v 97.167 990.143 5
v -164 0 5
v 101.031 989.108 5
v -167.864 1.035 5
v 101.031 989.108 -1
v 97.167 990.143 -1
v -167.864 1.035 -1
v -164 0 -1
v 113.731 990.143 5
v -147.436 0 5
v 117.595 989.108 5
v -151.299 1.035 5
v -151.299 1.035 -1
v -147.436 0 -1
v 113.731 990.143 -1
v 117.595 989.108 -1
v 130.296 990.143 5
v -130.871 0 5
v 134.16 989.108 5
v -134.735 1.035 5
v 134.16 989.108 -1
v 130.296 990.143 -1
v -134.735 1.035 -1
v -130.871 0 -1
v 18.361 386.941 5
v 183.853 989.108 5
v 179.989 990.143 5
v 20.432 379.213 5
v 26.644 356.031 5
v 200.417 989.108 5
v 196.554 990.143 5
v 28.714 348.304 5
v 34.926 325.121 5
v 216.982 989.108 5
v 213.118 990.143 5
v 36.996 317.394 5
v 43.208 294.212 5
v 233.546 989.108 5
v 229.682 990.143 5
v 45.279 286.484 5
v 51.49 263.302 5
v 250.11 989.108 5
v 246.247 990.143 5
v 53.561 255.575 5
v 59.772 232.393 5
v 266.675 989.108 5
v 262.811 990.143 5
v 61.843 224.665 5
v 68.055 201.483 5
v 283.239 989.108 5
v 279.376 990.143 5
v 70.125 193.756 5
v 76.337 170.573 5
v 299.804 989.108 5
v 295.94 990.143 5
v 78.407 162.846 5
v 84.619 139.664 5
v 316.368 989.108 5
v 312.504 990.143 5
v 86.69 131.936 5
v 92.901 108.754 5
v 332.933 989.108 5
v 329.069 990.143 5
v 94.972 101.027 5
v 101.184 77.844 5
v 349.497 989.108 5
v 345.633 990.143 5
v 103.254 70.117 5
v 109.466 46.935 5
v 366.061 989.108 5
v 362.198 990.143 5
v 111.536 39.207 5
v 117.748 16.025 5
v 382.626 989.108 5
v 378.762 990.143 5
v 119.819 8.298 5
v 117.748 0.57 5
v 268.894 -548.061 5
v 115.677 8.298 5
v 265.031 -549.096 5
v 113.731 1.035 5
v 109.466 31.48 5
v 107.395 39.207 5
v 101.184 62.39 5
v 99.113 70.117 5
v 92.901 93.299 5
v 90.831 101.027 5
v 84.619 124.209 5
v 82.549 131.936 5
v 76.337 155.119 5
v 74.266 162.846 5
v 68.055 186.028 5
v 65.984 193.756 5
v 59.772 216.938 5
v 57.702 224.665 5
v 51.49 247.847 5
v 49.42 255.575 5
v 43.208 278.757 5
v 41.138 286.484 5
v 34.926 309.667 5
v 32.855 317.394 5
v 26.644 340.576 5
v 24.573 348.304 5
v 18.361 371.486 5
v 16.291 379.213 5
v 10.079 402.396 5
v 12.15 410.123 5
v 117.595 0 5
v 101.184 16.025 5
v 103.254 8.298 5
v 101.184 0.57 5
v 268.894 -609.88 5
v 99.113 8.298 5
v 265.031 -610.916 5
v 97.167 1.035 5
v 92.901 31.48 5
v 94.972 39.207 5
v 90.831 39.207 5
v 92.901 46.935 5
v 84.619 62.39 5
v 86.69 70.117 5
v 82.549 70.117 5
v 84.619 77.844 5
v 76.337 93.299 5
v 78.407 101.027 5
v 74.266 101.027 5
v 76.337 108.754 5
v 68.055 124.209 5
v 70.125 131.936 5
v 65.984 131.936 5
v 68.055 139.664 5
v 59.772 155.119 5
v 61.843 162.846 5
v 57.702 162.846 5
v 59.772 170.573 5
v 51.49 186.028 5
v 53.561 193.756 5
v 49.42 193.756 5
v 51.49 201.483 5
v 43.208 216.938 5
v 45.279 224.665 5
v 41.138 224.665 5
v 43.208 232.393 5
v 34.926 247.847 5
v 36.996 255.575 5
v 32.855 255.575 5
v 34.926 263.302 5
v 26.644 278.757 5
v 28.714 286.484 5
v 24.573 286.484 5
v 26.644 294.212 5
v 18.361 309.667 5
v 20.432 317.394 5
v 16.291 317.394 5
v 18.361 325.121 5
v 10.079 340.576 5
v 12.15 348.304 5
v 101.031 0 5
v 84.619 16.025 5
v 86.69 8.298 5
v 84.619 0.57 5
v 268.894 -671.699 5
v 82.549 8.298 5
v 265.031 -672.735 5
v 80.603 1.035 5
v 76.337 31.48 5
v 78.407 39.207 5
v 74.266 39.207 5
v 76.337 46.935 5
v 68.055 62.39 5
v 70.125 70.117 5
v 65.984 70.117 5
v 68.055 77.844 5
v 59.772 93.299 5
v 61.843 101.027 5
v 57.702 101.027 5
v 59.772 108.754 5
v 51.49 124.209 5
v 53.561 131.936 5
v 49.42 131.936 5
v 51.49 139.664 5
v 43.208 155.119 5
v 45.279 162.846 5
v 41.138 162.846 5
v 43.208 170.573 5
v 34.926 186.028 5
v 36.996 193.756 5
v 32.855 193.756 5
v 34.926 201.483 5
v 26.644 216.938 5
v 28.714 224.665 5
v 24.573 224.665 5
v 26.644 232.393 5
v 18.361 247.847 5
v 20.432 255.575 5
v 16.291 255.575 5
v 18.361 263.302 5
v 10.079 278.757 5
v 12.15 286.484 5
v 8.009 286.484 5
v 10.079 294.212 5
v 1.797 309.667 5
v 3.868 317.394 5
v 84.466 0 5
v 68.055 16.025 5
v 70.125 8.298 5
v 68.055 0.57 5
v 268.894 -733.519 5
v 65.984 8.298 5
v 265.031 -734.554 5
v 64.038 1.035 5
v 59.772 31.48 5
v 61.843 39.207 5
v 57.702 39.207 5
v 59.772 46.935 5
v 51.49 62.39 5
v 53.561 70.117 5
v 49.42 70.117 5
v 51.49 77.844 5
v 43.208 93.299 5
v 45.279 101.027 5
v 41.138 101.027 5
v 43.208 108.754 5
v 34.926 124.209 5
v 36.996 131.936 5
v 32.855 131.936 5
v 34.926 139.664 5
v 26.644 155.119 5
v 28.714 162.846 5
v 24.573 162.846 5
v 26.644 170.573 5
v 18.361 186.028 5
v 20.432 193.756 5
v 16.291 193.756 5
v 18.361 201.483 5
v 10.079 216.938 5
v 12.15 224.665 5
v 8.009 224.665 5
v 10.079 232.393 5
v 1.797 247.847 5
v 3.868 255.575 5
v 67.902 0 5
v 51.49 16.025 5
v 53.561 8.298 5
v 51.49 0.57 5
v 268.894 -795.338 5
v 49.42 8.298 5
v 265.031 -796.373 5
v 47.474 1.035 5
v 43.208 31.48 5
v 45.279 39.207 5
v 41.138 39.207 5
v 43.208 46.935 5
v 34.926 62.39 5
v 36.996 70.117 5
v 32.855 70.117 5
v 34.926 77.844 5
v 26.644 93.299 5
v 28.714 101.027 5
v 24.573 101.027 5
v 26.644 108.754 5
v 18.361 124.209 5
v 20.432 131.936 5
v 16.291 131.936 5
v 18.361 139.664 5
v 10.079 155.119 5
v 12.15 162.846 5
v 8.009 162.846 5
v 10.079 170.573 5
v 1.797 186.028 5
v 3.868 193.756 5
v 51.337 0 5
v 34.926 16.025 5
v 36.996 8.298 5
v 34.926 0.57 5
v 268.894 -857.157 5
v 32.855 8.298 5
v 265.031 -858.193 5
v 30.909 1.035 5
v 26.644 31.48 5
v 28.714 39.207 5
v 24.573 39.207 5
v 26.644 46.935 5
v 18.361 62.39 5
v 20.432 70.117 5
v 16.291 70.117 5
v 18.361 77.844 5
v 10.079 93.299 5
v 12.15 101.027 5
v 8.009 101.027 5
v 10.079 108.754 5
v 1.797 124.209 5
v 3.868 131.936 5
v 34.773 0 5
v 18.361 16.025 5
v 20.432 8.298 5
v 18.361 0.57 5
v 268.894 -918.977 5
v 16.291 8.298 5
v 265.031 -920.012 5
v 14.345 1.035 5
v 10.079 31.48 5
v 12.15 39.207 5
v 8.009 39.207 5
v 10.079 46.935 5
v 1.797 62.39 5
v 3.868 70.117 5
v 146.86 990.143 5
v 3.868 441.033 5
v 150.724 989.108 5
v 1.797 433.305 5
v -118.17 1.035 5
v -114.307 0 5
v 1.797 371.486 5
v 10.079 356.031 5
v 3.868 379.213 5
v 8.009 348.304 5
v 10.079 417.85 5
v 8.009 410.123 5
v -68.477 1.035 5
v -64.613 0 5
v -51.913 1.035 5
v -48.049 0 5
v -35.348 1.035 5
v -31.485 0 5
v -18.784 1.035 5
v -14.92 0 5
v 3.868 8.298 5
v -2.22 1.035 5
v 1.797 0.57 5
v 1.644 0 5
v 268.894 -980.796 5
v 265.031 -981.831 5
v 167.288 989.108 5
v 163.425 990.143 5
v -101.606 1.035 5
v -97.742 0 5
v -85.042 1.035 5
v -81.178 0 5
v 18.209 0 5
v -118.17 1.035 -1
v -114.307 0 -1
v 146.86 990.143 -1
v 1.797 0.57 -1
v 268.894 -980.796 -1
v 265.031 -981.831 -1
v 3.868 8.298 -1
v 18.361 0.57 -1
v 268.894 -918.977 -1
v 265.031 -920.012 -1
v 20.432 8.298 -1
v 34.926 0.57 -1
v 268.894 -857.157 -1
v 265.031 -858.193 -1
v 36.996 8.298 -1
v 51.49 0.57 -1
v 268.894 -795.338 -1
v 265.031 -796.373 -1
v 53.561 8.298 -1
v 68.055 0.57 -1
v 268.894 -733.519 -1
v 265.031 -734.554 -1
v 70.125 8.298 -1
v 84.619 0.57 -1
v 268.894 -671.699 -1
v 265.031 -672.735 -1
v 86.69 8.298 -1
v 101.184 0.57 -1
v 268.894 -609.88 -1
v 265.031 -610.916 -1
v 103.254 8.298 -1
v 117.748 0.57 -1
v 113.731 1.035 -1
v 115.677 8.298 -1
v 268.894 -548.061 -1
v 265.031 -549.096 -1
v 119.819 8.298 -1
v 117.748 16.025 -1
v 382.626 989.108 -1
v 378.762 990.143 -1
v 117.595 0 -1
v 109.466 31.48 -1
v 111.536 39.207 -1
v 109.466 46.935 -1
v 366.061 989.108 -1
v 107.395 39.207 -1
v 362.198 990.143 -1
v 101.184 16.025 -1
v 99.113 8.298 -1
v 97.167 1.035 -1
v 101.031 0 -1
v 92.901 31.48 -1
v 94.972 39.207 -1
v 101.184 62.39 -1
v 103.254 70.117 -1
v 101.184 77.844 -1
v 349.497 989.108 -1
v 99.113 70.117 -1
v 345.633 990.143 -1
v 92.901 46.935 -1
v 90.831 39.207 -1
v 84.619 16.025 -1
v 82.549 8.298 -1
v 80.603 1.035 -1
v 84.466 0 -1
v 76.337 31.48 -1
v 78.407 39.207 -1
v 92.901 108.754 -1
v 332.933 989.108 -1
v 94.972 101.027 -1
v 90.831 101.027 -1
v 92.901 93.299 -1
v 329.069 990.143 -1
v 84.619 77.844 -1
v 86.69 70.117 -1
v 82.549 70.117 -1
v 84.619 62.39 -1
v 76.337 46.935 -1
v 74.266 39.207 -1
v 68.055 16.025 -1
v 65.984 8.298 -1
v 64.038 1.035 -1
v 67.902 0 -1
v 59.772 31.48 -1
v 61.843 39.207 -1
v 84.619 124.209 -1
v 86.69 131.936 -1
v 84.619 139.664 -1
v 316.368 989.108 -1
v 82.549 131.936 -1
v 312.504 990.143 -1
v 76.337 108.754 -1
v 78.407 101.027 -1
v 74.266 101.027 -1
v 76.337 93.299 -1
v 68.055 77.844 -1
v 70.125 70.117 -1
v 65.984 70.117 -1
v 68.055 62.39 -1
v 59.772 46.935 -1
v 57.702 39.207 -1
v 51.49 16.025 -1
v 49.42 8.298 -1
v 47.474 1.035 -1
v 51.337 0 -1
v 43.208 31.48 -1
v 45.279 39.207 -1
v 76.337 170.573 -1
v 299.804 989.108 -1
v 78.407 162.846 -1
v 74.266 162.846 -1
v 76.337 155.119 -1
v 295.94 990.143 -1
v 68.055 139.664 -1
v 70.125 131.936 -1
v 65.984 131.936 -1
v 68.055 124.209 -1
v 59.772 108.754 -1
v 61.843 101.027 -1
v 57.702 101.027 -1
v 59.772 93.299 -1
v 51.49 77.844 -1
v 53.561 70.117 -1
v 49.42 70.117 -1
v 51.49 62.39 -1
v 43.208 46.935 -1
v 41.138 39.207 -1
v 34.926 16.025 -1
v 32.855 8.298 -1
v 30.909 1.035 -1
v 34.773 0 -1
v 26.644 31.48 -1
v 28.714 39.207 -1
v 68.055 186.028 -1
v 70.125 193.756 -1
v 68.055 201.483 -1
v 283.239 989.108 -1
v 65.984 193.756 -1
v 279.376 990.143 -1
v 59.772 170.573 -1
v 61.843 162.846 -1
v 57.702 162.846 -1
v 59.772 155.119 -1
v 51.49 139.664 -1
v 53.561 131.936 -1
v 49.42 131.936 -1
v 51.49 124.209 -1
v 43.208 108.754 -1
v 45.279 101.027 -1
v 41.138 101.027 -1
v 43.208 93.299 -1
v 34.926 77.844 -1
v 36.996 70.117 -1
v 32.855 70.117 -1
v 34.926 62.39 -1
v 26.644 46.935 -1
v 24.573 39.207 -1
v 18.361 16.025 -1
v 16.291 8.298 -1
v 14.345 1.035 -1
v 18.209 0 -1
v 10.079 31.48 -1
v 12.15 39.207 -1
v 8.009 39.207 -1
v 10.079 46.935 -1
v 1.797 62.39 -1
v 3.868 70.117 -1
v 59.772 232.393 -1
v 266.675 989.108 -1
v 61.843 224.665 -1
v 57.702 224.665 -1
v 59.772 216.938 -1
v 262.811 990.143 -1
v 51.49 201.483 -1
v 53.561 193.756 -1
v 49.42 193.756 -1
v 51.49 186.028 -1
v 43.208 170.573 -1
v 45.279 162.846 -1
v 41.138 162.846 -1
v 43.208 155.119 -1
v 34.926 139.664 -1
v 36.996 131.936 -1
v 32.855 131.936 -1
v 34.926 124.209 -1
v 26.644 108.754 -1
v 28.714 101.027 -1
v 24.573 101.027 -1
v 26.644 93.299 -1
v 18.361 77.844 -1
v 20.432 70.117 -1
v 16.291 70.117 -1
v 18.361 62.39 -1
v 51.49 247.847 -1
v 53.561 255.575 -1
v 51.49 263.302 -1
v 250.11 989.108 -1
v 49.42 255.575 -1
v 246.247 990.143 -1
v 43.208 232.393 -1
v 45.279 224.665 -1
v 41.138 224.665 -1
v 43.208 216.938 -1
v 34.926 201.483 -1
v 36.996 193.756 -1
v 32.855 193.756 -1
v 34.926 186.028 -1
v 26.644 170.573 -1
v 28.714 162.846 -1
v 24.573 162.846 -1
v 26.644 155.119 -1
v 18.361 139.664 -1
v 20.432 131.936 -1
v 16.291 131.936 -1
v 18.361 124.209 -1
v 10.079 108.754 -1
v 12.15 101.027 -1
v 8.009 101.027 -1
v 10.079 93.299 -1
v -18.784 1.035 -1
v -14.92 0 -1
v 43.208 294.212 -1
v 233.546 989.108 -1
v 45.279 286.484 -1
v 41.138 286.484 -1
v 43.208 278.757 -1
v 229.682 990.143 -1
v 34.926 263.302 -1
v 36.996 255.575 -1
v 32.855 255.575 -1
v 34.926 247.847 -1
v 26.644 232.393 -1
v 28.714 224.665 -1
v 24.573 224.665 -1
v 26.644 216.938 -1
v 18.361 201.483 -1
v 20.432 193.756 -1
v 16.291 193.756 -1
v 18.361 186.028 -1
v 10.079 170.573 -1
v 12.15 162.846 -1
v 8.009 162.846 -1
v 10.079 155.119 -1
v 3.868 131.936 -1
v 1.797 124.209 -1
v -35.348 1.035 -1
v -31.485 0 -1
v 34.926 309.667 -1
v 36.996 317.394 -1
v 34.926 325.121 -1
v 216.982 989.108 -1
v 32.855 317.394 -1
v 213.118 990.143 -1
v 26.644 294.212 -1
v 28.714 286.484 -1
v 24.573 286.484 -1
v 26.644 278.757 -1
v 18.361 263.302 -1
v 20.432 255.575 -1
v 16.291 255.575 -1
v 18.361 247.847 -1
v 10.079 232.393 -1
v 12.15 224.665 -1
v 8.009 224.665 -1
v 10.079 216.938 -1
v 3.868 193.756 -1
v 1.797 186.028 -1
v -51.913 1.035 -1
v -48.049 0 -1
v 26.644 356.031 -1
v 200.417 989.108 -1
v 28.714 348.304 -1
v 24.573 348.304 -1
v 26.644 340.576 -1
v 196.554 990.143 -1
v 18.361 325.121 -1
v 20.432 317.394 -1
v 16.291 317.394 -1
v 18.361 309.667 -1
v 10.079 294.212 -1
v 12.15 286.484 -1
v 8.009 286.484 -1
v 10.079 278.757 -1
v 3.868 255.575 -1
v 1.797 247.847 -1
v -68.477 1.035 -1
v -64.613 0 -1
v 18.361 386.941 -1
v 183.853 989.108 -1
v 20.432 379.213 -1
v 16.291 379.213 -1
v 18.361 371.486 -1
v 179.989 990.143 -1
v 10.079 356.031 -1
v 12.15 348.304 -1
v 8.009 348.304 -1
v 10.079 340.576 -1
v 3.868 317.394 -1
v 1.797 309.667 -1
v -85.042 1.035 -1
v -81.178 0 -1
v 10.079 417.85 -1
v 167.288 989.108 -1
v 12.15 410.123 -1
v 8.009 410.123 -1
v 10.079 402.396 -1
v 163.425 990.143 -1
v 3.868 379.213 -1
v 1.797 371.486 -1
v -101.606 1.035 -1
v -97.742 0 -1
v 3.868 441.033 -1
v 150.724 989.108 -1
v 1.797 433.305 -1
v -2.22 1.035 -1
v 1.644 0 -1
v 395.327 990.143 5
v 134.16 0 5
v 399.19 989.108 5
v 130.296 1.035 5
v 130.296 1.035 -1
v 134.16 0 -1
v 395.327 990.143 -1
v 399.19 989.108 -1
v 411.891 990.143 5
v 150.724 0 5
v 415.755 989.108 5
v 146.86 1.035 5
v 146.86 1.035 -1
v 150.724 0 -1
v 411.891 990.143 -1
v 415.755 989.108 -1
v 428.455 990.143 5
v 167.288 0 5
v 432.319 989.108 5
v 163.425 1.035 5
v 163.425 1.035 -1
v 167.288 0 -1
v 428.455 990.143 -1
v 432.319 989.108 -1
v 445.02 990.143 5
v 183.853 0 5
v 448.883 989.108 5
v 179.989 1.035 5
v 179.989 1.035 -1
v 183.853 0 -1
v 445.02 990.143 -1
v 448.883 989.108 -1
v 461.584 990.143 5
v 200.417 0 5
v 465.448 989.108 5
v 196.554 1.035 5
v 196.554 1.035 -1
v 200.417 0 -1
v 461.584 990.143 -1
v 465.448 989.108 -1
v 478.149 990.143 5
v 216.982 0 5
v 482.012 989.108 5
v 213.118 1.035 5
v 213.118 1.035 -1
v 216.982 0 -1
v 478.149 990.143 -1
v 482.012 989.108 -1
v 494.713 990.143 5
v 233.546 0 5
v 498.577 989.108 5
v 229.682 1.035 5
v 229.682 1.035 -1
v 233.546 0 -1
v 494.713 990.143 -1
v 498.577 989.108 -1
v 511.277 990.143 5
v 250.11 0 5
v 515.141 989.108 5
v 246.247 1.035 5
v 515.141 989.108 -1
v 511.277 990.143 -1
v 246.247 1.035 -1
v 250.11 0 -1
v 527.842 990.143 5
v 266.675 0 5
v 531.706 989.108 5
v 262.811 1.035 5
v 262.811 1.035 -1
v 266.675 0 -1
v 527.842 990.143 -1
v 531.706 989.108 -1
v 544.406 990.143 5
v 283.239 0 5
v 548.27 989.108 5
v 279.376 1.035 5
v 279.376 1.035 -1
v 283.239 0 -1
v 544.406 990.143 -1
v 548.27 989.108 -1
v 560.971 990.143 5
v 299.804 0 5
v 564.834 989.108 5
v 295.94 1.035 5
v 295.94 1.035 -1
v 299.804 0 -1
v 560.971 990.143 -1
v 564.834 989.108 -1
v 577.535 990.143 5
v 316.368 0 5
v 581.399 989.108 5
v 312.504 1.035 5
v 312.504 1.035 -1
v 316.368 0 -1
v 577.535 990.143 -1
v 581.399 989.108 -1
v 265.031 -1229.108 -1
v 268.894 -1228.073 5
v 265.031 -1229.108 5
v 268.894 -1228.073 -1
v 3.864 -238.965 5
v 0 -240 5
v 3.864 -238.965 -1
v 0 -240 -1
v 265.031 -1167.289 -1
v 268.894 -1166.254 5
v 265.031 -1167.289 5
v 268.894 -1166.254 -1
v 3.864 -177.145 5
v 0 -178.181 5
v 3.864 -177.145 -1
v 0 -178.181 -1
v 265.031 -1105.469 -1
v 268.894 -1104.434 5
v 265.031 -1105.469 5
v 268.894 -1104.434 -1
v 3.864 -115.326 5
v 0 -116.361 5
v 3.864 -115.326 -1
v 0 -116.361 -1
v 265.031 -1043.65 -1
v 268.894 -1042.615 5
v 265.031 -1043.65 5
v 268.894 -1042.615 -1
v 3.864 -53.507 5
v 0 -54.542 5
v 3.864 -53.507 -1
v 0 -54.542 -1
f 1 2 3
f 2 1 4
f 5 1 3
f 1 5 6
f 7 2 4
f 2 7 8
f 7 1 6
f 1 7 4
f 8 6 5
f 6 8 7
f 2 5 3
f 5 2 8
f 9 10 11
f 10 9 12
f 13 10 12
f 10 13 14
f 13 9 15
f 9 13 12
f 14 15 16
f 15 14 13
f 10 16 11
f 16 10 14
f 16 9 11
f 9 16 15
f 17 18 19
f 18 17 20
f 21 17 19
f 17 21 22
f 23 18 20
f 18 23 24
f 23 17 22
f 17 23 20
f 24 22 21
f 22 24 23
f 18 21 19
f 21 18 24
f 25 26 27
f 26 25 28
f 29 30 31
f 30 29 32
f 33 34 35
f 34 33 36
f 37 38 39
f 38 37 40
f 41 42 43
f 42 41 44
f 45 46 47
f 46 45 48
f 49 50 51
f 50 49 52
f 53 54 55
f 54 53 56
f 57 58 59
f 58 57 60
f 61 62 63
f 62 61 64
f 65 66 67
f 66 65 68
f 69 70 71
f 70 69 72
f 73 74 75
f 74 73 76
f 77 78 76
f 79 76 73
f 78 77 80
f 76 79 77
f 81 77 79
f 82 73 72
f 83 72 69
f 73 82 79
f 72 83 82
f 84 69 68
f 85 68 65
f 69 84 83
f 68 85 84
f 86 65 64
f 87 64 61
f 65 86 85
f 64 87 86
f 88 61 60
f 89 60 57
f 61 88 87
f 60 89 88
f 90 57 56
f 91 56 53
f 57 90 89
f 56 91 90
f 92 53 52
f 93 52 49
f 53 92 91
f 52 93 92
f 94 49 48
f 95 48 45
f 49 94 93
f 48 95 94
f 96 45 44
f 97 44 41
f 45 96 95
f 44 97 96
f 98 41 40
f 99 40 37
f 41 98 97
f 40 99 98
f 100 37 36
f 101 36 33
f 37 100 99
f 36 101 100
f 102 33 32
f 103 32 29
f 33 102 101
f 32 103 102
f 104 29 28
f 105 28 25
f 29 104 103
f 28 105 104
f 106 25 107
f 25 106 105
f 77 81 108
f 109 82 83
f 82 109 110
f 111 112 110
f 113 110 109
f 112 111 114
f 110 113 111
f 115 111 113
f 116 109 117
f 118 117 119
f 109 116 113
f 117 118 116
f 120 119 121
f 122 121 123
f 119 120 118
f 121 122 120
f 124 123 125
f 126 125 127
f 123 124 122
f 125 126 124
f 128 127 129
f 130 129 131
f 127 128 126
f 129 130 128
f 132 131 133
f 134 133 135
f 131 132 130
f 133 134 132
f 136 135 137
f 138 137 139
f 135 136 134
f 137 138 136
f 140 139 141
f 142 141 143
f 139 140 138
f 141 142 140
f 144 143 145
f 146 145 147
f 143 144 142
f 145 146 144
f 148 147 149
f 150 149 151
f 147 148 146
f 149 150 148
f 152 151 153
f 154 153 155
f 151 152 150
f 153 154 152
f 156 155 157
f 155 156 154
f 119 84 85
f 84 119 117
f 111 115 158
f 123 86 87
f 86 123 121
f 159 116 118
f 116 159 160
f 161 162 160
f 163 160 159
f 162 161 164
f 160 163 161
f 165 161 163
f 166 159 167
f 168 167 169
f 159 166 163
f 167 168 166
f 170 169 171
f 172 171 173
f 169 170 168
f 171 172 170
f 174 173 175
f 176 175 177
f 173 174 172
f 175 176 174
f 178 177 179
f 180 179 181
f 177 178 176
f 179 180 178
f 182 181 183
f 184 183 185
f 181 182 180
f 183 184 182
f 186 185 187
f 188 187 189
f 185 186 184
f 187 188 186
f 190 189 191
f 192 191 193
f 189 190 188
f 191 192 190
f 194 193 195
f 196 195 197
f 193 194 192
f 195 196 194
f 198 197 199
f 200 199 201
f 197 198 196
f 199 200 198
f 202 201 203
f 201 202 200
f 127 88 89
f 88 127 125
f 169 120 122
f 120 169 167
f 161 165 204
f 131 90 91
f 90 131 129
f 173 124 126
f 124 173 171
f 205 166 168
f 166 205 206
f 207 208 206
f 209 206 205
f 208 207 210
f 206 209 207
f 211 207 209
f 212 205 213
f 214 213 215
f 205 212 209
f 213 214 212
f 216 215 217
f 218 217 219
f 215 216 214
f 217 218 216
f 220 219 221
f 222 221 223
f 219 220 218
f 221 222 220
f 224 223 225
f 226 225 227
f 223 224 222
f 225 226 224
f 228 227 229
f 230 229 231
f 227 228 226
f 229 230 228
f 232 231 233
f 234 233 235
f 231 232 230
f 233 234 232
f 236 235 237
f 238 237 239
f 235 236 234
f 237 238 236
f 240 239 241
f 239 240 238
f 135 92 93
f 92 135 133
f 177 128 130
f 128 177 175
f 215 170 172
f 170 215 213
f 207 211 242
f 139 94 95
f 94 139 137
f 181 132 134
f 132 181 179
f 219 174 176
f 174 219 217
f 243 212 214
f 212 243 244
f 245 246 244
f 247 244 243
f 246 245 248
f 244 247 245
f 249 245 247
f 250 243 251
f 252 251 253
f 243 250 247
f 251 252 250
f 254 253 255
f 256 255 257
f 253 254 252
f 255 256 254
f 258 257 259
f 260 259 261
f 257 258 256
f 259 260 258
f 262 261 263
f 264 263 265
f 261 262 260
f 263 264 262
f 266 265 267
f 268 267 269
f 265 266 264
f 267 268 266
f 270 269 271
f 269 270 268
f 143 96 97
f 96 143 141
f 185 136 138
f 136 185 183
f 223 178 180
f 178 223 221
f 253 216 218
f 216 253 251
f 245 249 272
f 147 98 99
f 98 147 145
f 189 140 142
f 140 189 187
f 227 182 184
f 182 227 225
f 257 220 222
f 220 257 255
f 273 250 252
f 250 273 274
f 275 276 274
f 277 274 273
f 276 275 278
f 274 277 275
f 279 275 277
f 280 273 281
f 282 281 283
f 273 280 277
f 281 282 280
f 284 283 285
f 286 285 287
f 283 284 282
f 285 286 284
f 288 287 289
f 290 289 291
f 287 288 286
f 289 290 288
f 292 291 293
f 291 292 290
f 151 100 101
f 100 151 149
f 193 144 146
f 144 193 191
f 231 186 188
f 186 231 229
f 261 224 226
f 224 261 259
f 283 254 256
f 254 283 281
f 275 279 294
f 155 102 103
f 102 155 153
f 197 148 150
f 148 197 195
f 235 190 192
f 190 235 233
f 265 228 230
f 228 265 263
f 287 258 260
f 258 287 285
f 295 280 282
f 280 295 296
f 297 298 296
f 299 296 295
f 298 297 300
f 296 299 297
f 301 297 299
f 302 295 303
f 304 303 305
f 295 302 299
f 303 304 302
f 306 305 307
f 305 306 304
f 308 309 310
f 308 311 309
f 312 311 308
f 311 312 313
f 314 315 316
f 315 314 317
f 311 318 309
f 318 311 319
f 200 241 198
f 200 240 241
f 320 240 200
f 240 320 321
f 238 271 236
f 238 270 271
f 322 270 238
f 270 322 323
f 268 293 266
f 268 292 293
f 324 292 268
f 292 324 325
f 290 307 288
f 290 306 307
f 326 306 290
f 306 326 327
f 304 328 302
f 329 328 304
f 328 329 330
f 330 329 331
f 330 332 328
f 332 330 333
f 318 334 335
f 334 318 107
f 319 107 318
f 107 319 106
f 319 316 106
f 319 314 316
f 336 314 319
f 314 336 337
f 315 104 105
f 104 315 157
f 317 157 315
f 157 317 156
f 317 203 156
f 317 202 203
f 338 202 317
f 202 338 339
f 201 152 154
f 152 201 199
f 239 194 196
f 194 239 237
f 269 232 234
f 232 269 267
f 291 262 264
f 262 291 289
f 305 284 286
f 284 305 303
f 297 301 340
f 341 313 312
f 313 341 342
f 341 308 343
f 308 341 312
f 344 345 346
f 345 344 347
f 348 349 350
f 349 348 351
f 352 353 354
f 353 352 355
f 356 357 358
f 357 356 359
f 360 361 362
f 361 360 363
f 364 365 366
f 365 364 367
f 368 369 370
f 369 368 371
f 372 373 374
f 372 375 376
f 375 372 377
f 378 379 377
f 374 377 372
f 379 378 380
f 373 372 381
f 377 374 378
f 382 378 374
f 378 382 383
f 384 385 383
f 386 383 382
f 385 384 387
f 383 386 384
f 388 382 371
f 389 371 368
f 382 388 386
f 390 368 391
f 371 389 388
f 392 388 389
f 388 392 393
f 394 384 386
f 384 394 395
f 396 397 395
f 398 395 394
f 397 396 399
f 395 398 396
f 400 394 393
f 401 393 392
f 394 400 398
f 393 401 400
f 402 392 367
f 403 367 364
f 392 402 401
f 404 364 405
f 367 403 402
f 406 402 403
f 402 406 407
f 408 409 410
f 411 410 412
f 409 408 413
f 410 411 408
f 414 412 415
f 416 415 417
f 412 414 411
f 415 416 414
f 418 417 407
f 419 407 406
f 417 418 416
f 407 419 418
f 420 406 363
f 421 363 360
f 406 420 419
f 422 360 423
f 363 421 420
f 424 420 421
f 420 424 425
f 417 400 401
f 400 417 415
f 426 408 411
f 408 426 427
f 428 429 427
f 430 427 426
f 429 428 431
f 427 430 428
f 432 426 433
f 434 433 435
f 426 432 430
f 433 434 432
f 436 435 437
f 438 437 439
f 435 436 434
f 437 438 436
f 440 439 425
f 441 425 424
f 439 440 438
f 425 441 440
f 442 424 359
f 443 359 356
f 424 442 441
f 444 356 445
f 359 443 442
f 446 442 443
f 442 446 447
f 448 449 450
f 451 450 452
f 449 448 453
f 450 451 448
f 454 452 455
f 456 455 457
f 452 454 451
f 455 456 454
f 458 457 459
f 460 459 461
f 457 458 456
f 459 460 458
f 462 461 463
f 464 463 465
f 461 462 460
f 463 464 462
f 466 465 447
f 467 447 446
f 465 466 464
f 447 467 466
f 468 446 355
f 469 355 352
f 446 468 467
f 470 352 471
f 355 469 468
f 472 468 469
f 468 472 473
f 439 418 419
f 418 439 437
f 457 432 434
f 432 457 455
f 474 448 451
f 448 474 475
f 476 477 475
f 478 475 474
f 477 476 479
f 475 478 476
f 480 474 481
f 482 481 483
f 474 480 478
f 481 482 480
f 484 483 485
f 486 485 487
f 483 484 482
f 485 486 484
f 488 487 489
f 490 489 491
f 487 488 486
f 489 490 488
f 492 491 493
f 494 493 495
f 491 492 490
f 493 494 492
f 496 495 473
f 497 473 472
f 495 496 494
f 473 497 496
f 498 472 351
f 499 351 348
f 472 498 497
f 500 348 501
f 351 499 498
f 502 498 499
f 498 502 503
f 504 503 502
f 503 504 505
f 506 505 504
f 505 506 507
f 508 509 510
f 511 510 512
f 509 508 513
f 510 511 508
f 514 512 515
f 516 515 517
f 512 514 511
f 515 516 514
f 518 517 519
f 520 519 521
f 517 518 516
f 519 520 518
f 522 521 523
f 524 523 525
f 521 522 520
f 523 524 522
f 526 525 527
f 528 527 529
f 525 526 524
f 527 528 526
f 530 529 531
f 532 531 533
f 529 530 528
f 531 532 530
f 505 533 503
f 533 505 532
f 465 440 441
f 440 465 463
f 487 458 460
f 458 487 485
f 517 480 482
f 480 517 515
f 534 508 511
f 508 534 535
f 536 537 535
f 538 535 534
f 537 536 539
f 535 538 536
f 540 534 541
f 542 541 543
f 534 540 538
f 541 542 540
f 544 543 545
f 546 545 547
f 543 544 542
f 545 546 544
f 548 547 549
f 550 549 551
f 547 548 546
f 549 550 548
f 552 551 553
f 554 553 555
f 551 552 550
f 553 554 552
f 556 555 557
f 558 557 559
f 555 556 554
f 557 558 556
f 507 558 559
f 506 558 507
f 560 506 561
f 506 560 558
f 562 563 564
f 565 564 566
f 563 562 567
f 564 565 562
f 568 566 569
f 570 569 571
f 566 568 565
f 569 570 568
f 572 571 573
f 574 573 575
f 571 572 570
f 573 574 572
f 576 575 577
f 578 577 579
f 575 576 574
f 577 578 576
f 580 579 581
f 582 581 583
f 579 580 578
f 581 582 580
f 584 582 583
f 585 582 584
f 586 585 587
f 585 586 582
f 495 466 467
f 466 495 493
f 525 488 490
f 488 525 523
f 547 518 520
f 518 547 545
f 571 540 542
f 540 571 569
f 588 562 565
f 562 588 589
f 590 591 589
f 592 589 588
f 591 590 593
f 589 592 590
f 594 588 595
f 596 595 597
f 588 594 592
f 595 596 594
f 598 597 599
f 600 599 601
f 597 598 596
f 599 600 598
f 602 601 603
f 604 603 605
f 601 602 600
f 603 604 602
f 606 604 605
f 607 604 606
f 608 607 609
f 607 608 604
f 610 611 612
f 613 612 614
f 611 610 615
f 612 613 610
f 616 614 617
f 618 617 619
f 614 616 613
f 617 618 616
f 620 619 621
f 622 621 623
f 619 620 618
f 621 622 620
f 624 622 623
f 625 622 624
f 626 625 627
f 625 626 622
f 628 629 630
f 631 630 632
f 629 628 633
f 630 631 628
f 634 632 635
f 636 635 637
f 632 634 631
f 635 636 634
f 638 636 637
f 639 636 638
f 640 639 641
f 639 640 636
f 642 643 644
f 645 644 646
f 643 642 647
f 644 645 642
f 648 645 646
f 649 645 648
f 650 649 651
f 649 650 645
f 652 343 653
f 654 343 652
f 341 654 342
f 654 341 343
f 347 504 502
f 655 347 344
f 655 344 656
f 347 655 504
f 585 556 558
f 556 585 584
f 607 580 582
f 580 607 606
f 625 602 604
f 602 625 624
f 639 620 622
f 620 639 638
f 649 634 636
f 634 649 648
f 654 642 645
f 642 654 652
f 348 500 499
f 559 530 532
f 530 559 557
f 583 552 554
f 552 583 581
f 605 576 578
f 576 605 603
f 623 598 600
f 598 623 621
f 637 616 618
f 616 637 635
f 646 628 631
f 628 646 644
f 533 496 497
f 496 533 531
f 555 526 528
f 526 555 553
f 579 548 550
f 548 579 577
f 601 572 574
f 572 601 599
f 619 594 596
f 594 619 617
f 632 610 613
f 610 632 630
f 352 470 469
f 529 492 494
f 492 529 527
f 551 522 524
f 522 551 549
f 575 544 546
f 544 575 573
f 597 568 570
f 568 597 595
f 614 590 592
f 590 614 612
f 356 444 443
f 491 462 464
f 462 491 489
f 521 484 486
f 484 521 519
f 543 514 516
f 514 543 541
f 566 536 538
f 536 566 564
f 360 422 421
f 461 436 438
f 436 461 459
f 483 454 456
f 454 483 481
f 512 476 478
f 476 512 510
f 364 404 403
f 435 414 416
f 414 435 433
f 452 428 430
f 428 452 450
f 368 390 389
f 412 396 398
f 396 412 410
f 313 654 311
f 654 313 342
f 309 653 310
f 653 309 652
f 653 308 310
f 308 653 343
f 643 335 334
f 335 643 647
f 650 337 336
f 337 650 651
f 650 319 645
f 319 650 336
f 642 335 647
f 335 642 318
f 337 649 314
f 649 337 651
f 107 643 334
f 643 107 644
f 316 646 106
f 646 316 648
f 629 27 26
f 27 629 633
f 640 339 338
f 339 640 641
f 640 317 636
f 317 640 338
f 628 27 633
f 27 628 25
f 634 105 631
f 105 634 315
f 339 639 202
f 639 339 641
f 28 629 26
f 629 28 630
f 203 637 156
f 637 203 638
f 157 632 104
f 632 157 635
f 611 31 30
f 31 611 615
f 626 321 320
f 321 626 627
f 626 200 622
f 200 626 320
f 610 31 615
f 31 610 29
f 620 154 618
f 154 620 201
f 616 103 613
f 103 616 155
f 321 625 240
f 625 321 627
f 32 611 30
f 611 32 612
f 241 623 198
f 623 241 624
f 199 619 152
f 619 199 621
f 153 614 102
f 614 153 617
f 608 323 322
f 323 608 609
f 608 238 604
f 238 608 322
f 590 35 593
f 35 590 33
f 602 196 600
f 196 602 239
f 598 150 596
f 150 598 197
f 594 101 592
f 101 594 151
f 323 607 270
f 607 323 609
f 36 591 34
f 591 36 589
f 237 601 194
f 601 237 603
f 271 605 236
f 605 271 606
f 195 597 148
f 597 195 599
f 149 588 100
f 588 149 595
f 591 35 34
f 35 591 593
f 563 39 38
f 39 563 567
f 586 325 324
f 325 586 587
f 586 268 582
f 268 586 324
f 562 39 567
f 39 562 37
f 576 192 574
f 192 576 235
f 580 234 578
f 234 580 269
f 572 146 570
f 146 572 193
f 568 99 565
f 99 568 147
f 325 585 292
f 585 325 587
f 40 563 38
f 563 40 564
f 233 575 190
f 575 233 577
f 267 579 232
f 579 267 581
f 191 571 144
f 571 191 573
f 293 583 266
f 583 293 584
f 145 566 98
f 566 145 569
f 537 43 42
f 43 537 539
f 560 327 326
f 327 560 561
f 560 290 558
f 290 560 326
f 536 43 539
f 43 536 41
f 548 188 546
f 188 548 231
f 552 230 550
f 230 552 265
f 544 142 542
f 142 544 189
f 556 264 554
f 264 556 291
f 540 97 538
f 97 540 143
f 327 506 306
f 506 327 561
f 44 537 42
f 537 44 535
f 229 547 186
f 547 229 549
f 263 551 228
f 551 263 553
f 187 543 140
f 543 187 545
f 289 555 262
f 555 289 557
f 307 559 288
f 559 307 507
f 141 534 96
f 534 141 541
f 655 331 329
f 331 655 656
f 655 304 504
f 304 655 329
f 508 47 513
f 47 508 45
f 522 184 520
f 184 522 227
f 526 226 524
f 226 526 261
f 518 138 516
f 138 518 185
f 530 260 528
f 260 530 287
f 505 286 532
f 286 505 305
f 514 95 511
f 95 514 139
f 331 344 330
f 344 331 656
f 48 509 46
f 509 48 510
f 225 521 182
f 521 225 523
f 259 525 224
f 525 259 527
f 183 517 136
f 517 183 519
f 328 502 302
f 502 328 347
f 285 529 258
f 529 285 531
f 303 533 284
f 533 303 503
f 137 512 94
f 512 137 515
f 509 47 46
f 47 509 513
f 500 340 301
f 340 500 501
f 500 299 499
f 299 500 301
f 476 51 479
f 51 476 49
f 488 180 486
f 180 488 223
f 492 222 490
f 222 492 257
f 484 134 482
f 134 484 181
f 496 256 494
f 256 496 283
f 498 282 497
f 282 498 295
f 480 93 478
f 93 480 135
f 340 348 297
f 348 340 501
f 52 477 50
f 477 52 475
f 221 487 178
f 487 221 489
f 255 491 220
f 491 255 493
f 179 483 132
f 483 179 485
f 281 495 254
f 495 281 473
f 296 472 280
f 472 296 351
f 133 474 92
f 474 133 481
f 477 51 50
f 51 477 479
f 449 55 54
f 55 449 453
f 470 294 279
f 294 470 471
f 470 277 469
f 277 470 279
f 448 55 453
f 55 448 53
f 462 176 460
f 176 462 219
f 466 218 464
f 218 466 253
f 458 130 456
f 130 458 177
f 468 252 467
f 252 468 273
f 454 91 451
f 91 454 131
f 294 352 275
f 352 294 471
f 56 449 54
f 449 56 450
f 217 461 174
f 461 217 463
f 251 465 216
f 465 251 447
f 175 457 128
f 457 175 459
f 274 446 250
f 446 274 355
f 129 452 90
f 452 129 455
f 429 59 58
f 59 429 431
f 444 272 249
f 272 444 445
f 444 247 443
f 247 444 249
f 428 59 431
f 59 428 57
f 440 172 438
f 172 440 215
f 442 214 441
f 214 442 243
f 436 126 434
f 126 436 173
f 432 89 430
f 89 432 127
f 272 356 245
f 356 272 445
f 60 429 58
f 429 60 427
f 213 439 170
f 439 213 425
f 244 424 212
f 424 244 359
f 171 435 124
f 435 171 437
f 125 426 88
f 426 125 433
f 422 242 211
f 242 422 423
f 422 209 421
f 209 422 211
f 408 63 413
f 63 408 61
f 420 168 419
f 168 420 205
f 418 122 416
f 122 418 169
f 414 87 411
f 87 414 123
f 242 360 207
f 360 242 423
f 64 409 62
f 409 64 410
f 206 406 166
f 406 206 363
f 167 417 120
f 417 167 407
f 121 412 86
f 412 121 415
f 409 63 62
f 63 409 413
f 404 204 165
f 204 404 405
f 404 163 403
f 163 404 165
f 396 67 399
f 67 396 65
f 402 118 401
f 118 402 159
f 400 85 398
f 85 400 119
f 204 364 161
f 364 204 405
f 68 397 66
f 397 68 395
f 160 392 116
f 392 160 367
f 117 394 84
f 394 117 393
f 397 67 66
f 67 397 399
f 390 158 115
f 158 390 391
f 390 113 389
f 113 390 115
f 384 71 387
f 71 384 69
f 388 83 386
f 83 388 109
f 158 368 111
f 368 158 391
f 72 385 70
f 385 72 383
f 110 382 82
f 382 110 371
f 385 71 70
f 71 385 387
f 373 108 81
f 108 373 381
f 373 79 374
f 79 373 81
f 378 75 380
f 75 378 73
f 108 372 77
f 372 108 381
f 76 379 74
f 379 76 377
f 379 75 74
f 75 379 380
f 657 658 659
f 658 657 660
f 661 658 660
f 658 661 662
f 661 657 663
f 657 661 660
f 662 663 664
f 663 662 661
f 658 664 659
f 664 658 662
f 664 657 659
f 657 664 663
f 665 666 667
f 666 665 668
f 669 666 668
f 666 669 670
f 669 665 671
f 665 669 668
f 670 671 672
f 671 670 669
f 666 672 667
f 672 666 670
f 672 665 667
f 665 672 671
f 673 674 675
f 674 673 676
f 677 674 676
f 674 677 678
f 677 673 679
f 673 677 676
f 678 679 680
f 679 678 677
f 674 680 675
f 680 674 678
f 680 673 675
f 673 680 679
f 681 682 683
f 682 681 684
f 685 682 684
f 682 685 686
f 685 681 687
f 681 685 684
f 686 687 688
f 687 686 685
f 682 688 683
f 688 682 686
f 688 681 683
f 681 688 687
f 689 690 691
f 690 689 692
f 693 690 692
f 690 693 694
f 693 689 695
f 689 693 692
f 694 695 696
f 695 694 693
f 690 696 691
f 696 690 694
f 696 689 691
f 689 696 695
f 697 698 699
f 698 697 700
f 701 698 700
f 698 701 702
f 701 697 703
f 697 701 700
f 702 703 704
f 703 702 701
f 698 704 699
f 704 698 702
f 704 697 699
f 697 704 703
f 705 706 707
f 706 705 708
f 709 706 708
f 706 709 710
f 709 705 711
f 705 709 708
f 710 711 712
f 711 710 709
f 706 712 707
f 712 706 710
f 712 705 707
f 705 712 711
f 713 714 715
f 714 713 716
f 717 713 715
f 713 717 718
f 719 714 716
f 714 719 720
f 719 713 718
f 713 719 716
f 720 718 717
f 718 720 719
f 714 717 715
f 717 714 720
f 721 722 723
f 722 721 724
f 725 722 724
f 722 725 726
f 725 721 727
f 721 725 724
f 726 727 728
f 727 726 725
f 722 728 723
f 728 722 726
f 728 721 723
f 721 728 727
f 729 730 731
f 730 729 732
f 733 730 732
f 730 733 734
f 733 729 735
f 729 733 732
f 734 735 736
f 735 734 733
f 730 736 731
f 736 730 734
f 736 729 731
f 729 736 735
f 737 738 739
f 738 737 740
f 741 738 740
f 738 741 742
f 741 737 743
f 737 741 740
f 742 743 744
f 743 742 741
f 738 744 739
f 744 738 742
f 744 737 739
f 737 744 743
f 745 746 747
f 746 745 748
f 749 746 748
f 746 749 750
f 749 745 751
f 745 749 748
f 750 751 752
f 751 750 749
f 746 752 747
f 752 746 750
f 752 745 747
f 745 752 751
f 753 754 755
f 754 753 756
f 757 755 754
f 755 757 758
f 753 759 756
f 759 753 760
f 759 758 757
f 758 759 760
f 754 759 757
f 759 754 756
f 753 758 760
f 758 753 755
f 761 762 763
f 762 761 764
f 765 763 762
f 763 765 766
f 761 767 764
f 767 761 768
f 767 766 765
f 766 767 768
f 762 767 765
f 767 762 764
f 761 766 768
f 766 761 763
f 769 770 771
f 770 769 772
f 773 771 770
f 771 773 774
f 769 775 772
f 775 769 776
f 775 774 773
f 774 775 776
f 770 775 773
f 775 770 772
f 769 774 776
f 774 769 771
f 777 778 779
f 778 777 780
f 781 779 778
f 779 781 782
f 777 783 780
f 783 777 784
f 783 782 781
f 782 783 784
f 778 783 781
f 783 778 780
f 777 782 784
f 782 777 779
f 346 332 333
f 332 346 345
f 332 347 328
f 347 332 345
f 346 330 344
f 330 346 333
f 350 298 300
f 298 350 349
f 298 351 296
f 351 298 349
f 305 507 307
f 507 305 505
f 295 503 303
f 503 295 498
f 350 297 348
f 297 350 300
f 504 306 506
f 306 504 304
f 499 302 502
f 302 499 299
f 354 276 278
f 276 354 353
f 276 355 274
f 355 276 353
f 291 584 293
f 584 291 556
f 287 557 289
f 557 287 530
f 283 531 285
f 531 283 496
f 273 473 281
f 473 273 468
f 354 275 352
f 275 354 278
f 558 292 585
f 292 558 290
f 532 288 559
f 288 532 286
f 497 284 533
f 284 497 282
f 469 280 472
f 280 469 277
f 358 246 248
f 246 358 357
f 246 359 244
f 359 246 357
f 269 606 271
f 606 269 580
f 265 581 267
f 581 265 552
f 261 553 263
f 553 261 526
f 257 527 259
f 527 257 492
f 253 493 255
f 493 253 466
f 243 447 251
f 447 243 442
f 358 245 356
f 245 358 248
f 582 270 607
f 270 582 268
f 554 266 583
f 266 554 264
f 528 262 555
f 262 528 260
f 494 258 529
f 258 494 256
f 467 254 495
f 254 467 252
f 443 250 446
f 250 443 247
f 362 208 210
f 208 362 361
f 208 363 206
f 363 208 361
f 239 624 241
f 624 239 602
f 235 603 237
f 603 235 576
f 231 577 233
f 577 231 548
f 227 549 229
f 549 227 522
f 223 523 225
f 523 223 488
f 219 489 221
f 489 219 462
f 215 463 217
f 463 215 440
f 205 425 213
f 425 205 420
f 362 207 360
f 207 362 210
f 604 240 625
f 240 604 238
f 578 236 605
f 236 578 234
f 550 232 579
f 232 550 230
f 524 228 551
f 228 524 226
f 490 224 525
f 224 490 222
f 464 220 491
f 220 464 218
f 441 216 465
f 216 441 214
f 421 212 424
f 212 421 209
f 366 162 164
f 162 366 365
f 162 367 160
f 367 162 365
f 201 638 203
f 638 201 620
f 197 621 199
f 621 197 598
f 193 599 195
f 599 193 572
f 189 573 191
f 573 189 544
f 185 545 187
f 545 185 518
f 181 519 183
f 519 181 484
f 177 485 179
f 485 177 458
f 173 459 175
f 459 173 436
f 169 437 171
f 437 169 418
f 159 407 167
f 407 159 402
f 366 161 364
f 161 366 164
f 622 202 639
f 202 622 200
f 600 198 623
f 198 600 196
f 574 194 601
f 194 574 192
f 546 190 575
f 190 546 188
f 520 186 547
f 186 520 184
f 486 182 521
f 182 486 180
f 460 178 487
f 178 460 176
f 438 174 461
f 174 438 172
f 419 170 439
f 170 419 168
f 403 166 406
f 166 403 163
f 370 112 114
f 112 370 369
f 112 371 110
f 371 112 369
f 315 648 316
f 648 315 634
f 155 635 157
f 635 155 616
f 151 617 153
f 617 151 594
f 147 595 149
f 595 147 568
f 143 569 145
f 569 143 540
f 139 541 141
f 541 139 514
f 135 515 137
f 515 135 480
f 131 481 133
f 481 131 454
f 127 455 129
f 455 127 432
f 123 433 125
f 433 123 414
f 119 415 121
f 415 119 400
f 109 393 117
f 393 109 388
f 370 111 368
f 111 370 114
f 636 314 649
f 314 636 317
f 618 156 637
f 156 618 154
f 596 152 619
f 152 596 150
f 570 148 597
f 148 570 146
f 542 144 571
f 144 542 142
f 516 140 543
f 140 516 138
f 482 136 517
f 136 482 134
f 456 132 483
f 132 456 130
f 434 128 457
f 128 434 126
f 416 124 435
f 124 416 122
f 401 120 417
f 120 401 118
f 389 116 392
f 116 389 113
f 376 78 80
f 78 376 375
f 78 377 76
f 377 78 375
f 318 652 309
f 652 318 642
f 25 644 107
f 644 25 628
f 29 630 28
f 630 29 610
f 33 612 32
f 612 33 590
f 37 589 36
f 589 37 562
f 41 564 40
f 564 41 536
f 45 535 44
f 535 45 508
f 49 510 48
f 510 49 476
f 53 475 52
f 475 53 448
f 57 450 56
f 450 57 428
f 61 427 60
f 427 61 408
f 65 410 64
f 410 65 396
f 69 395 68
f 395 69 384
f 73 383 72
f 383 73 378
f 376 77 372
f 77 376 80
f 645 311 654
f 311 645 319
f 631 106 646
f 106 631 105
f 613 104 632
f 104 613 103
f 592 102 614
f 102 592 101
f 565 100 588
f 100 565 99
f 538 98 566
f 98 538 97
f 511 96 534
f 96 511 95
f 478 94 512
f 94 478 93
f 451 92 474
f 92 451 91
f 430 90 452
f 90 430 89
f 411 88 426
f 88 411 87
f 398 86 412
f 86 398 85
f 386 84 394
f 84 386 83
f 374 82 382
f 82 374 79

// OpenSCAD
// file: utils.scad
use <MCAD/boxes.scad>

BIG = [1024, 1024, 1024];

module mark(name, height, size = 2) {
	linear_extrude(height, center = false)	text(name, size = size);
}
module hole(w, h) {
	translate([w / 2, h / 2, 0])		roundedBox(size=[w, h, 1024], radius = w / 4, sidesonly = true);
}
module ellipsis(w, h) {
	translate([w / 2, h / 2, 0])
		resize([w, h, 1024])
			cylinder(1024, 1024, 1024);
}
module cornerHole(base, m, in, out, height) {
	delta = (out - in) / 2;
		translate([m,					m,					0])	ellipsis(in, in);
		translate([base[0] - m,	m,					0])	ellipsis(in, in);
		translate([base[0] - m,	base[1] - m,		0])	ellipsis(in, in);
		translate([m,					base[1] - m,		0])	ellipsis(in, in);

		translate([m - delta,					m - delta,					height])	ellipsis(out, out);
		translate([base[0] - m  - delta,	m - delta,					height])	ellipsis(out, out);
		translate([base[0] - m  - delta,	base[1] - m - delta,	height])	ellipsis(out, out);
		translate([m - delta,					base[1] - m - delta,	height])	ellipsis(out, out);
}
module lineBox(outter = [100, 100, 100], t = 2) {
	size = outter - [t*2, t*2, t*2];
	center = false;

	translate([t, t, t])	{
		
	// x
	translate([0, 0, 0])						rotate([0, 90, 0])		cylinder(h = size[0], r = t, center = center);
	translate([0, size[1], 0])			rotate([0, 90, 0])		cylinder(h = size[0], r = t, center = center);
	translate([0, size[1], size[2]])	rotate([0, 90, 0])		cylinder(h = size[0], r = t, center = center);
	translate([0, 0, size[2]])			rotate([0, 90, 0])		cylinder(h = size[0], r = t, center = center);

	// y
	translate([0, 0, 0])						rotate([270, 0, 0])		cylinder(h = size[1], r = t, center = center);
	translate([size[0], 0, 0])			rotate([270, 0, 0])		cylinder(h = size[1], r = t, center = center);
	translate([size[0], 0, size[2]])	rotate([270, 0, 0])		cylinder(h = size[1], r = t, center = center);
	translate([0, 0, size[2]])			rotate([270, 0, 0])		cylinder(h = size[1], r = t, center = center);

	// z
	translate([0, 0, 0])						rotate([0, 0, 0])		cylinder(h = size[2], r = t, center = center);
	translate([size[0], 0, 0])			rotate([0, 0, 0])		cylinder(h = size[2], r = t, center = center);
	translate([size[0], size[1], 0])	rotate([0, 0, 0])		cylinder(h = size[2], r = t, center = center);
	translate([0, size[1], 0])	rotate([0, 0, 0])				cylinder(h = size[2], r = t, center = center);
	}
}
module hide(show = 0) {
	if (show > 0) children();
	else scale([0, 0, 0])	children();
}

module t() {
	c = [0.5, 0.5, 0.5, 0.5];
	d = [0.5, 0.5, 0.0, 0.5];
	
	color(c)	difference() {
		cube([4, 16, 2]);
		translate([2, -2, -1])	cube([4, 4, 4]);
	}
	color(d)	translate([8, 0, 0])	cube([16, 4, 2]);
}

module test(b) {
	
	c = [0.5, 0.5, 0.5, 0.5];
	d = [0.5, 0.5, 0.0, 0.5];
	
	color(c)	difference() {
		cube(b);
		translate([-BIG[0]+b[1]/2, b[1]/2, -BIG[2] / 2])	cube(BIG);
		//translate([b[0]-b[1]/2, b[1]/2, -1])	cube([b[1], b[1], b[2]*2]);
	}
}
		//translate([-BIG[0]+16, 16, 0])	cube(BIG);
test([16, 4, 2]);
//cube(BIG);
// file: landscape.scad
use <MCAD/boxes.scad>
use <utils.scad>

PALETTE = [
	[0.3, 0.1, 0.0, 0.5],	//	갈색, 칼손잡이
	[0.5, 0.5, 0.5, 0.5],	//	회색, 칼날
	[0.9, 0.9, 0.9, 1.0],	//	흰색, 상판
	[0.0, 0.0, 0.9, 0.5],	//	파랑
	[0.0, 0.0, 0.0, 0.0]	//	검정 투명, 호환성 예약
];

// 리트랙션을 줄일려면, 각진선이 유리하다
module hole(w, h) {
	translate([w / 2, h / 2, 0])
		roundedBox(size=[w, h, 1024], radius = w / 4, sidesonly = true);
		//cube([w, h, 1024], center = true);
}

// [가로, 세로, 높이], 홈너비
// 리트랙션을 줄일려면, 각진선이 유리하다
module hilt(base, r) {
	translate([base[0] / 2, base[1] / 2, base[2] / 2])
		roundedBox(size=base, radius = r, sidesonly = true);
		//cube([base[0], base[1], base[2]], center = true);
}

function landscapeSize()  = [160, 88, 4];
module landscape() {
	base =  landscapeSize();	//	상판
	t = base[2];		//	thick 껍질 두께
	m = 16;	//	margin 여유
	HILT = [16, 32, 16];	//	손잡이

	difference() {
		union() {
			//	상판
			color(c=PALETTE[2])		translate([base[0] / 2, base[1] / 2, t / 2])		roundedBox(size=base, radius = m / 4, sidesonly = true);
			
			//	서명
			//color(c=PALETTE[1])		translate([base[0] - m / 2 - 2, m / 4, t])		mark("andold", 0.2, 1);

			//	손잡이
			translate([0, 0, 0])		color(c=PALETTE[0])		translate([m - HILT[0]/ 2 + 4 / 2, m - 4, 0])		hilt(HILT, 4);
		}
		
		translate([0, 0, 0]) {
			//	식도
			translate([m, m, 0])			hole(4, 60);
			translate([m + 16, m, 0])	hole(3, 60);

			// 과도
			translate([m + 32, m])		hole(3, 60);
			translate([m + 48, m])		hole(3, 60);

			// 빵칼
			translate([m + 64, m])	hole(3, 60);

			// 가위
			scissor = [16, 40];
			translate([base[0] - m - 5 - 48, base[1] / 2 - scissor[1] / 2, -1])		ellipsis(16, 40);
			translate([base[0] - m - 5 - 24, base[1] / 2 - scissor[1] / 2, -1])		ellipsis(16, 40);
			
			translate([base[0] - m - 5, m, 0])	hole(5, 60);
			// 여유
		}

		// 모서리 구멍
		//cornerHole(base, m / 2, 2, 4, 2);
	}
}
HALF = [1/2, 1/2, 1/2];
ONE = [1, 1, 1];
scale(ONE)	landscape();
// main file
use <MCAD/boxes.scad>
use <landscape.scad>
use <utils.scad>

ZERO = [0, 0, 0];
HALF = [1/2, 1/2, 1/2];
ONE = [1, 1, 1];

// 주요 상수
THICK = 4;
HEIGHT = 240;
OPACITY = 0.75;

function bodyOnePieceSize()  = [landscapeSize()[0] + THICK, landscapeSize()[1] + THICK, HEIGHT];

module board(size, degree) {
	{
		for (dx = [-size[0]: size[2] / sin(degree) * 4: size[0] * 2]) {
			translate([dx, 0, -1])	rotate([0, 0, degree])	cube([1024, size[2], size[2] + 2]);
		}
		for (dx = [-size[1]: size[2] / cos(degree) * 4: size[1] * 2]) {
			translate([0, dx, -1])	rotate([0, 0,  - degree])	cube([1024, size[2], size[2] + 2]);
		}
		//cube(size);
	}
}
module boards(size, degree) {
	board([size[0], size[2], THICK], degree);
}

module pillar(size, radius) {
	translate([radius,				radius,				0])	cylinder(size[2], radius, radius);
	translate([size[0] - radius,	radius, 0])	cylinder(size[2], radius, radius);
	translate([size[0] - radius,	size[1] - radius, 0])	cylinder(size[2], radius, radius);
	translate([radius,				size[1] - radius, 0])	cylinder(size[2], radius, radius);

	translate([size[0] / 2, radius, 0])	cylinder(size[2], radius, radius);
	translate([size[0] / 2, size[1] - radius, 0])	cylinder(size[2], radius, radius);
}
module main() {
	size = bodyOnePieceSize();
	scale(ZERO) {
		cube(size - [0, 0, size[2] - THICK]);
		translate([0, 0, size[2] - THICK * 2])	cube(size - [0, 0, size[2] - THICK]);
		pillar(size, THICK);
	}
	
	boards(size, 75);
}

main();
